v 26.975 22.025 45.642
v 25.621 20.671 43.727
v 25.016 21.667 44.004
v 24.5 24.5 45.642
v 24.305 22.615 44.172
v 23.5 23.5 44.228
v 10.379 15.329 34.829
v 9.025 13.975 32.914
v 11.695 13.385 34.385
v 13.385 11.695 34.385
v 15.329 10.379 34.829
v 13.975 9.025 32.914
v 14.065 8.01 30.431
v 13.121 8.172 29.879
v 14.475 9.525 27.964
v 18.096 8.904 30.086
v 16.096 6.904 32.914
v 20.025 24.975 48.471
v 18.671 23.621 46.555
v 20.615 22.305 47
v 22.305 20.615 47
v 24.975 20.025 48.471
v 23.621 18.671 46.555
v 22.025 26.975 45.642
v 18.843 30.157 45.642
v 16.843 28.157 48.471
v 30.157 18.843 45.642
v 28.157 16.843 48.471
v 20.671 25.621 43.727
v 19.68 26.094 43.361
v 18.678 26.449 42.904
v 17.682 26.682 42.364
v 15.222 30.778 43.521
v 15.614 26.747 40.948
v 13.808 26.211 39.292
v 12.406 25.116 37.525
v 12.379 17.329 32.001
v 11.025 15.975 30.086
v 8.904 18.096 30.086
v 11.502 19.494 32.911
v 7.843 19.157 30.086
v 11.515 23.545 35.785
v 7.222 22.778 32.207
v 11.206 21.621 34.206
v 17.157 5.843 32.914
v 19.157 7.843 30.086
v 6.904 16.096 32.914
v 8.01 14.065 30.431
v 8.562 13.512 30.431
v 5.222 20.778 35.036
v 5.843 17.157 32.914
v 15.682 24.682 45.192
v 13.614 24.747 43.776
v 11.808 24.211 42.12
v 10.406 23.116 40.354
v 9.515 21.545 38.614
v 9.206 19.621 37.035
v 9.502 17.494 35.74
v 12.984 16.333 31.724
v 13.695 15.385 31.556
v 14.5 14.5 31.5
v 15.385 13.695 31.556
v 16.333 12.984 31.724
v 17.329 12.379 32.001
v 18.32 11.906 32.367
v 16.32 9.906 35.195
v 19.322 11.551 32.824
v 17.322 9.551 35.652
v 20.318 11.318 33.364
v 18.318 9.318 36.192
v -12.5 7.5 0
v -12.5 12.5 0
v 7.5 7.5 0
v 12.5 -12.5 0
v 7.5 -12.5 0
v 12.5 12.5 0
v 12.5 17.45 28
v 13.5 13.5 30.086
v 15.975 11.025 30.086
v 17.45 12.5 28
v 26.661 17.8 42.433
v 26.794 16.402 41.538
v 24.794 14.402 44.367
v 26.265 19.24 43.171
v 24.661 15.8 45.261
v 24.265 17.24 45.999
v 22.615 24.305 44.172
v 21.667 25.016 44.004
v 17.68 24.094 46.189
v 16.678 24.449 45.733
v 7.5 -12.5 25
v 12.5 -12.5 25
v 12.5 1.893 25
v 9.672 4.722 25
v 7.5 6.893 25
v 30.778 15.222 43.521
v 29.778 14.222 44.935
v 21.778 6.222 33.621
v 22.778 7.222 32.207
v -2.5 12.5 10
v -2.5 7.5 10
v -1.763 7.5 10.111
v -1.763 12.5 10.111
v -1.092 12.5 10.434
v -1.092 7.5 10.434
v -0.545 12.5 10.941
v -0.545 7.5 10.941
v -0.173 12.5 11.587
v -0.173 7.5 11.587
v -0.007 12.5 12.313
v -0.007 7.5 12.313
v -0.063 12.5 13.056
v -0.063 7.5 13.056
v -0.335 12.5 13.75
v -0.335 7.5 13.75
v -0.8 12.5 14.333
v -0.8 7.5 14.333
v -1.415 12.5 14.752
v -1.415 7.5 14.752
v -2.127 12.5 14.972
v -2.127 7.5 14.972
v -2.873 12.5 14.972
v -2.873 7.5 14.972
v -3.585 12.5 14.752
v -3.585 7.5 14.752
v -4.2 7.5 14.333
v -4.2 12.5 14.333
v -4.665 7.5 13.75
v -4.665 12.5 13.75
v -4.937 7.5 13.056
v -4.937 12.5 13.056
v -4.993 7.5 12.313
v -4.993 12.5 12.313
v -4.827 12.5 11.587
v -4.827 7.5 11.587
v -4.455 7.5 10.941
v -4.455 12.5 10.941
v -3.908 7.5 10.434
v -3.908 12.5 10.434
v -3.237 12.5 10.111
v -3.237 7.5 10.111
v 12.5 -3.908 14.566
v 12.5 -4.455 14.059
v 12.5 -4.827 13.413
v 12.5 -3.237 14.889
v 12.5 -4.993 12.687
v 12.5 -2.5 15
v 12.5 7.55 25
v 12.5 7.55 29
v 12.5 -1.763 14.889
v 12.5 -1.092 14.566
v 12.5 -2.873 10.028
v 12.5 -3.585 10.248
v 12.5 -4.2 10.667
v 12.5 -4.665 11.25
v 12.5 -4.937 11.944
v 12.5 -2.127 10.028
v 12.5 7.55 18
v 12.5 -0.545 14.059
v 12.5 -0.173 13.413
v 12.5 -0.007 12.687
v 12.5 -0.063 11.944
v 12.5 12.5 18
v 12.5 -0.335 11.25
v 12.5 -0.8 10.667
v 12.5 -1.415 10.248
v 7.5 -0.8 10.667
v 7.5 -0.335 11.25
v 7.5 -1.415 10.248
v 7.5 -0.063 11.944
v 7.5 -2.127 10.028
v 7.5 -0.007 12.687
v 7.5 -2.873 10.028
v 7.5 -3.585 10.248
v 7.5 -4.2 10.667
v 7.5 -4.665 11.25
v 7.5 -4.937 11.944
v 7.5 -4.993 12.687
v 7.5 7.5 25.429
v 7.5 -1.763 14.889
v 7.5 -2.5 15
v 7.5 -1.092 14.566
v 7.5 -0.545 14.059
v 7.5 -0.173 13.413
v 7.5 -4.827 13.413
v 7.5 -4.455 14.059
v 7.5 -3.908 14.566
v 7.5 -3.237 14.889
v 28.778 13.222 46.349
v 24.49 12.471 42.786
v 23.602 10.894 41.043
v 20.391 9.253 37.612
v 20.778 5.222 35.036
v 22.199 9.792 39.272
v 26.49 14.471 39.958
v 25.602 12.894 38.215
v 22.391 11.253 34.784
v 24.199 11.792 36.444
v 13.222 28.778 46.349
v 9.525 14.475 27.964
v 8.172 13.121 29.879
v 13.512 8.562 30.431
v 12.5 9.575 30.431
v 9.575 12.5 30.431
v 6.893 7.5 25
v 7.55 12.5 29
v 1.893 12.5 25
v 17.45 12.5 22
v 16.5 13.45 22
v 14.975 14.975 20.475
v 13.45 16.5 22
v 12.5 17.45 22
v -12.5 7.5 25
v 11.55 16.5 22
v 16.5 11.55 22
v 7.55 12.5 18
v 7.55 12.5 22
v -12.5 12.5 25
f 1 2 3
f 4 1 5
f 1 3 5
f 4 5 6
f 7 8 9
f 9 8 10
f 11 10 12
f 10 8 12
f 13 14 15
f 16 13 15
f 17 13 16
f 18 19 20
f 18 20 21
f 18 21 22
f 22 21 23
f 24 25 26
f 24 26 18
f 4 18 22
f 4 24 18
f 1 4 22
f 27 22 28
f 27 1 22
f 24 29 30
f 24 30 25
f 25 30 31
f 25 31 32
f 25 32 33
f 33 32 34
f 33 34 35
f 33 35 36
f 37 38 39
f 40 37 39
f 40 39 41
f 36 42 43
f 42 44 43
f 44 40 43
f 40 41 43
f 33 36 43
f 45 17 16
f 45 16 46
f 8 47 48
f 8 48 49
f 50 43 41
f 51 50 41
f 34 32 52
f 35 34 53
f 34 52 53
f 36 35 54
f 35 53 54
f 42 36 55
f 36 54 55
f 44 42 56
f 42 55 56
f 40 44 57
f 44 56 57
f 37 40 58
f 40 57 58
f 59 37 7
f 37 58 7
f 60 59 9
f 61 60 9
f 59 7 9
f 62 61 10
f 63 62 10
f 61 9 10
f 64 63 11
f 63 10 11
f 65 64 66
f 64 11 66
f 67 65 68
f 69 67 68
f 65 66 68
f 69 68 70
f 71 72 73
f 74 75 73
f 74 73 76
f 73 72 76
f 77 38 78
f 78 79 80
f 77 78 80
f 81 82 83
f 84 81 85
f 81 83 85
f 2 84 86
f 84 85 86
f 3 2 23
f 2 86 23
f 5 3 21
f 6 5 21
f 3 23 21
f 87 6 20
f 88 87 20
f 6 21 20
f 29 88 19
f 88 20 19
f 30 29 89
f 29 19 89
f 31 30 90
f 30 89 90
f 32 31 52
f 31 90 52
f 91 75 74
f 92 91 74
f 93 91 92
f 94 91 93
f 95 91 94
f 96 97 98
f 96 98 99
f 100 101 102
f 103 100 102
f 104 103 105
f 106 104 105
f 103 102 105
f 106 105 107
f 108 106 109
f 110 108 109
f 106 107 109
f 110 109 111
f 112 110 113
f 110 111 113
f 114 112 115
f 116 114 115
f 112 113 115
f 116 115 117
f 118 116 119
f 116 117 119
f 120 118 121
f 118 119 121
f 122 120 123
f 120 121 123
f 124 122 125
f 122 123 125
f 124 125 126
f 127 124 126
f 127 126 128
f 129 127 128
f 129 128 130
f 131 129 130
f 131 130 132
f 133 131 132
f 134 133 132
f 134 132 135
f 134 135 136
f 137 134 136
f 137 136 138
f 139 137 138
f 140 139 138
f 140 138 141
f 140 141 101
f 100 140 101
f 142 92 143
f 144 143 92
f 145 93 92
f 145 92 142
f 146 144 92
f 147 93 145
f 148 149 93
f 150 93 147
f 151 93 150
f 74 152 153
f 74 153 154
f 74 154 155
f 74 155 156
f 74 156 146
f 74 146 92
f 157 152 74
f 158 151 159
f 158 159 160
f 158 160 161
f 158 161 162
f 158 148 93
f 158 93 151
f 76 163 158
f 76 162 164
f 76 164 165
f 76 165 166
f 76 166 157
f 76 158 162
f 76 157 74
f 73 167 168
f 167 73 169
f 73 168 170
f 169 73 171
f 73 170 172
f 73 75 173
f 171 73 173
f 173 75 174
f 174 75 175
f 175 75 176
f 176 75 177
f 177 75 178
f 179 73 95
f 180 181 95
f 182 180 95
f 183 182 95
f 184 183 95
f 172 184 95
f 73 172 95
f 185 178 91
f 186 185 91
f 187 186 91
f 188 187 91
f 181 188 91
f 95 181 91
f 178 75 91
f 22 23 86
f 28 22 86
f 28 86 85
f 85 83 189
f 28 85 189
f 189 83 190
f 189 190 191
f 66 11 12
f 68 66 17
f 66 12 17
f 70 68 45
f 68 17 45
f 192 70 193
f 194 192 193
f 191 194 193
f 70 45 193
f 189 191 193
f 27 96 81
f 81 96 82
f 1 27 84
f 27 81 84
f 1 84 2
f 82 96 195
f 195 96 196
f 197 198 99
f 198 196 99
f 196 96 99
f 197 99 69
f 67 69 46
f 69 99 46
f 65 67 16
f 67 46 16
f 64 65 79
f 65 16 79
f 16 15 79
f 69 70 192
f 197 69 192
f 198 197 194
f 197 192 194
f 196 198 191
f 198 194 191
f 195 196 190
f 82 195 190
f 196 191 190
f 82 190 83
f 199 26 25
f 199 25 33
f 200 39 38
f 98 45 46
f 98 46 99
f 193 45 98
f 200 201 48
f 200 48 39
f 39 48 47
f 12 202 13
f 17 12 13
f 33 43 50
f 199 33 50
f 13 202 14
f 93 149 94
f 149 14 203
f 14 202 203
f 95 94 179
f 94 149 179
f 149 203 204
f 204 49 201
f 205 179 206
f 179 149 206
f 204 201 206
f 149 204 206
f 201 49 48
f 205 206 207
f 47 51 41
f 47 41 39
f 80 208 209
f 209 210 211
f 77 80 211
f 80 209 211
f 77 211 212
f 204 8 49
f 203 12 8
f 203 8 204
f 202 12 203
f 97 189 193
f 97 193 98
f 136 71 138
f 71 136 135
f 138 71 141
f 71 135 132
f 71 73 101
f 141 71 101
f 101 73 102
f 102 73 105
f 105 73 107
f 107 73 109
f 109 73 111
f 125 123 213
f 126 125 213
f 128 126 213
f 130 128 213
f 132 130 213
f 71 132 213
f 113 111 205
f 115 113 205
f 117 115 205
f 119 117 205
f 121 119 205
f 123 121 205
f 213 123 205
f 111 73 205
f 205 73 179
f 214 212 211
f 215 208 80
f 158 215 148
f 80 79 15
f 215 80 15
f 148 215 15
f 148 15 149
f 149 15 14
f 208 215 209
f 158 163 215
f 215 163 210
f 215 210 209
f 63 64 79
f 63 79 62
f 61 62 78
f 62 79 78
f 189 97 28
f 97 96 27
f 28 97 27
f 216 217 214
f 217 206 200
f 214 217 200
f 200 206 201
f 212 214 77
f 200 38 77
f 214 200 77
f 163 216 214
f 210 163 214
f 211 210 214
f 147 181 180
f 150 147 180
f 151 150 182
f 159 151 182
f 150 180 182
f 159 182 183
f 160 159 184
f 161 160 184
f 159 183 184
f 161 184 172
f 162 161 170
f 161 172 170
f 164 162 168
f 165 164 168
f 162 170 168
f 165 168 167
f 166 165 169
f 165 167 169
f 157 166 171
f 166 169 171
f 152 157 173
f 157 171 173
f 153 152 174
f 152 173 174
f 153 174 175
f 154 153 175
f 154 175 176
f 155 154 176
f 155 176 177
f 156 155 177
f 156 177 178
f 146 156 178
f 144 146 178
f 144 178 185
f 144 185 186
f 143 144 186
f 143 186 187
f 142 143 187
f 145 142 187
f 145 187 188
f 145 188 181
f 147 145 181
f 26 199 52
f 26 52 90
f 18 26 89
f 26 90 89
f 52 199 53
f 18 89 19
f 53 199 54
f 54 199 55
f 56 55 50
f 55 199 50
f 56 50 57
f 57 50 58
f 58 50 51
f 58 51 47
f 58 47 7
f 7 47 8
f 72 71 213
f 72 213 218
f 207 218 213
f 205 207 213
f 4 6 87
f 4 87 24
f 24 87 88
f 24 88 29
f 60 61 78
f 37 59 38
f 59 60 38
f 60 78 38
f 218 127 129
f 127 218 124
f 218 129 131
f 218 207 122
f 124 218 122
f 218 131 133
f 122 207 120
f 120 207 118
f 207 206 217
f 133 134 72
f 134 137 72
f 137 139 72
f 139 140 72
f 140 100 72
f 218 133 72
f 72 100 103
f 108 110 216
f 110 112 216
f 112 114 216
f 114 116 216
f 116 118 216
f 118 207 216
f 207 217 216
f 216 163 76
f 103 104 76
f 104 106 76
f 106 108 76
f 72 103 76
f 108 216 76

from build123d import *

# Parameters (mm, degrees)
SKETCH_7_W           = 25
SKETCH_7_H           = 25
EXTRUDE_4_DEPTH      = 25
SKETCH_8_W           = 20
SKETCH_8_H           = 20
CUT_EXTRUDE_1_DEPTH  = 25
EXTRUDE_5_DEPTH      = 10
EXTRUDE_5_DEPTH_BACK = 3
CUT_EXTRUDE_2_DEPTH  = 10
EXTRUDE_6_DEPTH      = 22
CUT_EXTRUDE_3_DEPTH  = 68.266533187
CUT_EXTRUDE_4_DEPTH  = 67.673882167
CHAMFER_1_SIZE       = 4
CHAMFER_1_SIZE_2     = 5.616920973
CHAMFER_2_SIZE       = 3
SKETCH_19_R          = 2.5
CUT_EXTRUDE_5_DEPTH  = 62.956153018
SKETCH_20_R          = 2.5
CUT_EXTRUDE_6_DEPTH  = 62.956153018


with BuildPart() as part:
    # 草图7 → 凸台-拉伸4 (new body)
    with BuildSketch(Plane.XY):
        Rectangle(SKETCH_7_W, SKETCH_7_H)
    extrude(amount=EXTRUDE_4_DEPTH)

    # 草图8 → 切除-拉伸1 (cut)
    with BuildSketch(Plane.XY.offset(25)):
        with Locations((-2.5, -2.5)):
            Rectangle(SKETCH_8_W, SKETCH_8_H)
    extrude(amount=-CUT_EXTRUDE_1_DEPTH, mode=Mode.SUBTRACT)

    # 草图10 → 凸台-拉伸5 (add, two sides: drawn at the far end of the back side and taken through both)
    with BuildSketch(Plane.XY.offset(25).offset(-EXTRUDE_5_DEPTH_BACK)):
        Polygon((7.550252532, 12.5), (12.5, 7.550252532), (17.449747468, 12.5), (12.5, 17.449747468), align=None)
    extrude(amount=EXTRUDE_5_DEPTH + EXTRUDE_5_DEPTH_BACK)

    # 草图12 → 切除-拉伸2 (cut)
    with BuildSketch(Plane(origin=(2.474873734, -2.474873734, 0), x_dir=(0, 0, -1), z_dir=(0.7071067811865479, -0.7071067811865472, 0))):
        Polygon((-35, 21.17766953), (-35, 14.17766953), (-28, 21.17766953), align=None)
    extrude(amount=-CUT_EXTRUDE_2_DEPTH, mode=Mode.SUBTRACT)

    # 草图14 → 凸台-拉伸6 (add)
    with BuildSketch(Plane(origin=(17.386931804, 17.386931804, 24.588834765), x_dir=(0.8660254037844374, -0.2886751345948163, -0.4082482904638636), z_dir=(0.5000000000000024, 0.5000000000000028, 0.707106781186544))):
        Polygon((-9.655381356, -7.592593438), (-7.34598028, -4.326607114), (-13.469704637, 0.003519905), (-14.624405175, -1.629473257), (-15.779105713, -3.262466419), align=None)
        Polygon((-6.797643323, -9.61331938), (-4.488242246, -6.347333056), (-7.34598028, -4.326607114), (-9.655381356, -7.592593438), align=None)
        Polygon((-1.630504213, -8.368058998), (-4.488242246, -6.347333056), (-6.797643323, -9.61331938), (-3.93990529, -11.634045322), (-3.745735964, -11.359448428), (-1.748641805, -8.535130783), align=None)
        Polygon((4.493220144, -12.698186017), (-1.630504213, -8.368058998), (-1.748641805, -8.535130783), (-3.745735964, -11.359448428), (-3.93990529, -11.634045322), (2.183819067, -15.964172341), (3.338519605, -14.331179179), align=None)
    extrude(amount=EXTRUDE_6_DEPTH)

    # 草图15 → 切除-拉伸3 (cut, through all)
    with BuildSketch(Plane(origin=(-5.886931804, -5.886931804, 8.325378798), x_dir=(0.8660254037844424, -0.28867513459480876, 0.4082482904638581), z_dir=(-0.49999999999999367, -0.5000000000000014, 0.7071067811865511))):
        with BuildLine():
            ThreePointArc((35.427552476, 37.374203131), (32.228532553, 44.255237221), (24.905634667, 46.244590168))
            Line((24.905634667, 46.244590168), (27.949470284, 28.503816094))
            ThreePointArc((27.949470284, 28.503816094), (33.308586565, 31.573223054), (35.427552476, 37.374203131))
        make_face()
        with BuildLine():
            Line((27.949470284, 28.503816094), (24.905634667, 46.244590168))
            ThreePointArc((24.905634667, 46.244590168), (17.557165439, 35.852285323), (27.949470284, 28.503816094))
        make_face()
    extrude(amount=-CUT_EXTRUDE_3_DEPTH, mode=Mode.SUBTRACT)

    # 草图17 → 切除-拉伸4 (cut, through all)
    with BuildSketch(Plane(origin=(2.474873734, -2.474873734, 0), x_dir=(0, 0, -1), z_dir=(0.7071067811865479, -0.7071067811865472, 0))):
        Polygon((-32.914213562, 16.263455967), (-25, 14.17766953), (-35, 14.17766953), align=None)
    extrude(amount=-CUT_EXTRUDE_4_DEPTH, mode=Mode.SUBTRACT)

    # 倒角1
    # the kernel refuses this chamfer: 5.616920973, 4 mm, written as the material it adds along each edge
    with BuildSketch(Plane(origin=(-2.724247244, 22.774499775, 25), x_dir=(-0.7071067811865471, -0.707106781186548, 0), z_dir=(0.707106781186548, -0.7071067811865471, 0))) as chamfer_1_piece_1_section:
        Polygon((CHAMFER_1_SIZE, 0), (-CHAMFER_1_SIZE_2 * 0.254847364233, -CHAMFER_1_SIZE_2 * 0.966981292987), (0, 0), align=None)
    chamfer_1_piece_1 = extrude(amount=36.060673858, mode=Mode.PRIVATE)
    chamfer_1_piece_1 = split(chamfer_1_piece_1, bisect_by=Plane(origin=(12.5, 22.774499775, 25), z_dir=(-1, 0, 0)), keep=Keep.TOP, mode=Mode.PRIVATE)
    chamfer_1_piece_1 = split(chamfer_1_piece_1, bisect_by=Plane(origin=(-2.724247244, 12.5, 25), z_dir=(0, -1, 0)), keep=Keep.TOP, mode=Mode.PRIVATE)
    chamfer_1_piece_1 = split(chamfer_1_piece_1, bisect_by=Plane(origin=(-2.724247244, 7.5, 25), z_dir=(0, 1, 0)), keep=Keep.TOP, mode=Mode.PRIVATE)
    add(chamfer_1_piece_1)
    with BuildSketch(Plane(origin=(7.550252532, 12.5, 25), x_dir=(-0.7071067811865471, -0.707106781186548, 0), z_dir=(0.707106781186548, -0.7071067811865471, 0))) as chamfer_1_piece_2_section:
        Polygon((CHAMFER_1_SIZE, 0), (-CHAMFER_1_SIZE_2 * 0.254847364233, -CHAMFER_1_SIZE_2 * 0.966981292987), (0, 0), align=None)
    chamfer_1_piece_2 = extrude(amount=7, mode=Mode.PRIVATE)
    chamfer_1_piece_2 = split(chamfer_1_piece_2, bisect_by=Plane(origin=(7.5, 12.5, 25), z_dir=(1, 0, 0)), keep=Keep.TOP, mode=Mode.PRIVATE)
    add(chamfer_1_piece_2)
    with BuildSketch(Plane(origin=(-2.724247244, 22.774499775, 25), x_dir=(-0.7071067811865471, -0.707106781186548, 0), z_dir=(0.707106781186548, -0.7071067811865471, 0))) as chamfer_1_piece_3_section:
        Polygon((CHAMFER_1_SIZE, 0), (-CHAMFER_1_SIZE_2 * 0.254847364233, -CHAMFER_1_SIZE_2 * 0.966981292987), (0, 0), align=None)
    chamfer_1_piece_3 = extrude(amount=36.060673858, mode=Mode.PRIVATE)
    chamfer_1_piece_3 = split(chamfer_1_piece_3, bisect_by=Plane(origin=(12.5, 22.774499775, 25), z_dir=(-1, 0, 0)), keep=Keep.TOP, mode=Mode.PRIVATE)
    chamfer_1_piece_3 = split(chamfer_1_piece_3, bisect_by=Plane(origin=(12.5, 7.550252532, 25), z_dir=(0.7071067811865479, -0.7071067811865472, 0)), keep=Keep.TOP, mode=Mode.PRIVATE)
    add(chamfer_1_piece_3)
    with BuildSketch(Plane(origin=(-2.73647942, 12.5, 22), x_dir=(0, 0, -1), z_dir=(1, 0, 0))) as chamfer_1_piece_4_section:
        Polygon((CHAMFER_1_SIZE, 0), (0, CHAMFER_1_SIZE), (0, 0), align=None)
    chamfer_1_piece_4 = extrude(amount=15.23647942, mode=Mode.PRIVATE)
    chamfer_1_piece_4 = split(chamfer_1_piece_4, bisect_by=Plane(origin=(2.406886556, 7.356634024, 22), z_dir=(0.7071067811865481, -0.7071067811865469, 0)), keep=Keep.TOP, mode=Mode.PRIVATE)
    add(chamfer_1_piece_4)
    with BuildSketch(Plane(origin=(12.5, 12.5, 22), x_dir=(0, 0, -1), z_dir=(0, -1, 0))) as chamfer_1_piece_5_section:
        Polygon((CHAMFER_1_SIZE, 0), (0, CHAMFER_1_SIZE), (0, 0), align=None)
    chamfer_1_piece_5 = extrude(amount=15.23647942, mode=Mode.PRIVATE)
    chamfer_1_piece_5 = split(chamfer_1_piece_5, bisect_by=Plane(origin=(14.974873734, 10.025126266, 22), z_dir=(-0.7071067811865479, 0.7071067811865472, 0)), keep=Keep.TOP, mode=Mode.PRIVATE)
    add(chamfer_1_piece_5)
    with BuildSketch(Plane(origin=(12.5, 22.786731952, 22), x_dir=(0, 0, -1), z_dir=(0, -1, 0))) as chamfer_1_piece_6a_section:
        Polygon((CHAMFER_1_SIZE, 0), (0, CHAMFER_1_SIZE), (0, 0), align=None)
    chamfer_1_piece_6a = extrude(amount=25.523211372, mode=Mode.PRIVATE)
    chamfer_1_piece_6a = split(chamfer_1_piece_6a, bisect_by=Plane(origin=(12.5, 12.5, 22), z_dir=(0, 1, 0)), keep=Keep.TOP, mode=Mode.PRIVATE)
    chamfer_1_piece_6a = split(chamfer_1_piece_6a, bisect_by=Plane(origin=(9.831507758, 20.11823971, 22), z_dir=(-0.7071067811865471, -0.7071067811865479, 0)), keep=Keep.TOP, mode=Mode.PRIVATE)
    with BuildSketch(Plane(origin=(-2.73647942, 12.5, 22), x_dir=(0, 0, -1), z_dir=(1, 0, 0))) as chamfer_1_piece_6b_section:
        Polygon((CHAMFER_1_SIZE, 0), (0, CHAMFER_1_SIZE), (0, 0), align=None)
    chamfer_1_piece_6b = extrude(amount=25.523211372, mode=Mode.PRIVATE)
    chamfer_1_piece_6b = split(chamfer_1_piece_6b, bisect_by=Plane(origin=(12.5, 12.5, 22), z_dir=(1, 0, 0)), keep=Keep.TOP, mode=Mode.PRIVATE)
    chamfer_1_piece_6b = split(chamfer_1_piece_6b, bisect_by=Plane(origin=(7.356634024, 22.593113444, 22), z_dir=(-0.7071067811865471, -0.7071067811865479, 0)), keep=Keep.TOP, mode=Mode.PRIVATE)
    chamfer_1_piece_6 = chamfer_1_piece_6a & chamfer_1_piece_6b
    add(chamfer_1_piece_6)

    # 倒角2
    # the kernel refuses this chamfer: 3 mm, written as the material it adds along each edge
    with BuildSketch(Plane(origin=(10.117349252, 5.167601784, 38.369577002), x_dir=(-0.4999999999999727, -0.5000000000000319, -0.7071067811865441), z_dir=(0.4999999999999975, 0.49999999999999795, -0.7071067811865509))) as chamfer_2_piece_1_section:
        Polygon((CHAMFER_2_SIZE, 0), (0, -CHAMFER_2_SIZE), (0, 0), align=None)
    chamfer_2_piece_1 = extrude(amount=11.715048964, mode=Mode.PRIVATE)
    chamfer_2_piece_1 = split(chamfer_2_piece_1, bisect_by=Plane(origin=(14.674958319, 9.725210851, 36.670886955), z_dir=(0.6837590295367584, 0.6837590295367588, -0.2548473642278849)), keep=Keep.TOP, mode=Mode.PRIVATE)
    add(chamfer_2_piece_1)
    with BuildSketch(Plane(origin=(10.117349252, 5.167601784, 38.369577002), x_dir=(-0.4999999999999727, -0.5000000000000319, -0.7071067811865441), z_dir=(0.4999999999999975, 0.49999999999999795, -0.7071067811865509))) as chamfer_2_piece_2_section:
        Polygon((CHAMFER_2_SIZE, 0), (0, -CHAMFER_2_SIZE), (0, 0), align=None)
    chamfer_2_piece_2 = extrude(amount=19.430097928, mode=Mode.PRIVATE)
    chamfer_2_piece_2 = split(chamfer_2_piece_2, bisect_by=Plane(origin=(14.674958319, 9.725210851, 36.670886955), z_dir=(-0.6837590295367584, -0.6837590295367588, 0.2548473642278849)), keep=Keep.TOP, mode=Mode.PRIVATE)
    chamfer_2_piece_2 = split(chamfer_2_piece_2, bisect_by=Plane(origin=(14.621320344, 9.671572875, 32), z_dir=(0.5000000000001488, 0.5000000000001488, -0.7071067811863374)), keep=Keep.TOP, mode=Mode.PRIVATE)
    add(chamfer_2_piece_2)
    with BuildSketch(Plane(origin=(5.167601784, 10.117349252, 38.369577002), x_dir=(-0.5000000000000279, -0.4999999999999769, -0.7071067811865442), z_dir=(0.4999999999999972, 0.4999999999999981, -0.7071067811865508))) as chamfer_2_piece_3_section:
        Polygon((CHAMFER_2_SIZE, 0), (0, CHAMFER_2_SIZE), (0, 0), align=None)
    chamfer_2_piece_3 = extrude(amount=11.715048964, mode=Mode.PRIVATE)
    chamfer_2_piece_3 = split(chamfer_2_piece_3, bisect_by=Plane(origin=(9.725210851, 14.674958319, 36.670886955), z_dir=(0.6837590295367584, 0.6837590295367588, -0.2548473642278849)), keep=Keep.TOP, mode=Mode.PRIVATE)
    add(chamfer_2_piece_3)
    with BuildSketch(Plane(origin=(5.167601784, 10.117349252, 38.369577002), x_dir=(-0.5000000000000279, -0.4999999999999769, -0.7071067811865442), z_dir=(0.4999999999999972, 0.4999999999999981, -0.7071067811865508))) as chamfer_2_piece_4_section:
        Polygon((CHAMFER_2_SIZE, 0), (0, CHAMFER_2_SIZE), (0, 0), align=None)
    chamfer_2_piece_4 = extrude(amount=19.430097928, mode=Mode.PRIVATE)
    chamfer_2_piece_4 = split(chamfer_2_piece_4, bisect_by=Plane(origin=(9.725210851, 14.674958319, 36.670886955), z_dir=(-0.6837590295367584, -0.6837590295367588, 0.2548473642278849)), keep=Keep.TOP, mode=Mode.PRIVATE)
    chamfer_2_piece_4 = split(chamfer_2_piece_4, bisect_by=Plane(origin=(9.671572875, 14.621320344, 32), z_dir=(0.5000000000001488, 0.5000000000001488, -0.7071067811863374)), keep=Keep.TOP, mode=Mode.PRIVATE)
    add(chamfer_2_piece_4)
    # the kernel refuses this chamfer: 3 mm, written as the material it takes off along each edge
    with BuildSketch(Plane(origin=(9.579349889, 25.135699075, 24.630422998), x_dir=(0.5000000000000019, 0.500000000000003, 0.7071067811865441), z_dir=(-0.4999999999999936, -0.5000000000000017, 0.707106781186551)), Plane(origin=(36.135699075, 20.579349889, 40.186772184), x_dir=(-0.5000000000000017, -0.5000000000000041, -0.7071067811865435), z_dir=(-0.49999999999999606, -0.4999999999999983, 0.7071067811865517))) as chamfer_2_2_piece_1:
        Polygon((CHAMFER_2_SIZE, 0), (0, -CHAMFER_2_SIZE), (0, 0), align=None)
    extrude(amount=19.430097928, mode=Mode.SUBTRACT)
    with BuildSketch(Plane(origin=(10.864300925, 26.420650111, 53.925926188), x_dir=(0.7071067811865505, -0.7071067811865446, -3.2729791283493846e-15), z_dir=(0.4999999999999941, 0.5000000000000017, -0.7071067811865506)), Plane(origin=(15.420650111, -0.135699075, 38.369577002), x_dir=(-0.7071067811865483, 0.7071067811865468, 1.224326607529039e-15), z_dir=(0.49999999999999667, 0.4999999999999989, -0.7071067811865507))) as chamfer_2_2_piece_2:
        Polygon((CHAMFER_2_SIZE, 0), (0, CHAMFER_2_SIZE), (0, 0), align=None)
    extrude(amount=19.430097928, mode=Mode.SUBTRACT)

    # 草图19 → 切除-拉伸5 (cut, through all)
    with BuildSketch(Plane.XZ.offset(-7.5)):
        with Locations(Location((-2.5, 12.5, 0), (0, 0, 270))):
            Circle(SKETCH_19_R)
    extrude(amount=-CUT_EXTRUDE_5_DEPTH, mode=Mode.SUBTRACT)

    # 草图20 → 切除-拉伸6 (cut, through all)
    with BuildSketch(Plane.ZY.offset(-7.5)):
        with Locations((12.5, -2.5)):
            Circle(SKETCH_20_R)
    extrude(amount=-CUT_EXTRUDE_6_DEPTH, mode=Mode.SUBTRACT)


solid = part.part
